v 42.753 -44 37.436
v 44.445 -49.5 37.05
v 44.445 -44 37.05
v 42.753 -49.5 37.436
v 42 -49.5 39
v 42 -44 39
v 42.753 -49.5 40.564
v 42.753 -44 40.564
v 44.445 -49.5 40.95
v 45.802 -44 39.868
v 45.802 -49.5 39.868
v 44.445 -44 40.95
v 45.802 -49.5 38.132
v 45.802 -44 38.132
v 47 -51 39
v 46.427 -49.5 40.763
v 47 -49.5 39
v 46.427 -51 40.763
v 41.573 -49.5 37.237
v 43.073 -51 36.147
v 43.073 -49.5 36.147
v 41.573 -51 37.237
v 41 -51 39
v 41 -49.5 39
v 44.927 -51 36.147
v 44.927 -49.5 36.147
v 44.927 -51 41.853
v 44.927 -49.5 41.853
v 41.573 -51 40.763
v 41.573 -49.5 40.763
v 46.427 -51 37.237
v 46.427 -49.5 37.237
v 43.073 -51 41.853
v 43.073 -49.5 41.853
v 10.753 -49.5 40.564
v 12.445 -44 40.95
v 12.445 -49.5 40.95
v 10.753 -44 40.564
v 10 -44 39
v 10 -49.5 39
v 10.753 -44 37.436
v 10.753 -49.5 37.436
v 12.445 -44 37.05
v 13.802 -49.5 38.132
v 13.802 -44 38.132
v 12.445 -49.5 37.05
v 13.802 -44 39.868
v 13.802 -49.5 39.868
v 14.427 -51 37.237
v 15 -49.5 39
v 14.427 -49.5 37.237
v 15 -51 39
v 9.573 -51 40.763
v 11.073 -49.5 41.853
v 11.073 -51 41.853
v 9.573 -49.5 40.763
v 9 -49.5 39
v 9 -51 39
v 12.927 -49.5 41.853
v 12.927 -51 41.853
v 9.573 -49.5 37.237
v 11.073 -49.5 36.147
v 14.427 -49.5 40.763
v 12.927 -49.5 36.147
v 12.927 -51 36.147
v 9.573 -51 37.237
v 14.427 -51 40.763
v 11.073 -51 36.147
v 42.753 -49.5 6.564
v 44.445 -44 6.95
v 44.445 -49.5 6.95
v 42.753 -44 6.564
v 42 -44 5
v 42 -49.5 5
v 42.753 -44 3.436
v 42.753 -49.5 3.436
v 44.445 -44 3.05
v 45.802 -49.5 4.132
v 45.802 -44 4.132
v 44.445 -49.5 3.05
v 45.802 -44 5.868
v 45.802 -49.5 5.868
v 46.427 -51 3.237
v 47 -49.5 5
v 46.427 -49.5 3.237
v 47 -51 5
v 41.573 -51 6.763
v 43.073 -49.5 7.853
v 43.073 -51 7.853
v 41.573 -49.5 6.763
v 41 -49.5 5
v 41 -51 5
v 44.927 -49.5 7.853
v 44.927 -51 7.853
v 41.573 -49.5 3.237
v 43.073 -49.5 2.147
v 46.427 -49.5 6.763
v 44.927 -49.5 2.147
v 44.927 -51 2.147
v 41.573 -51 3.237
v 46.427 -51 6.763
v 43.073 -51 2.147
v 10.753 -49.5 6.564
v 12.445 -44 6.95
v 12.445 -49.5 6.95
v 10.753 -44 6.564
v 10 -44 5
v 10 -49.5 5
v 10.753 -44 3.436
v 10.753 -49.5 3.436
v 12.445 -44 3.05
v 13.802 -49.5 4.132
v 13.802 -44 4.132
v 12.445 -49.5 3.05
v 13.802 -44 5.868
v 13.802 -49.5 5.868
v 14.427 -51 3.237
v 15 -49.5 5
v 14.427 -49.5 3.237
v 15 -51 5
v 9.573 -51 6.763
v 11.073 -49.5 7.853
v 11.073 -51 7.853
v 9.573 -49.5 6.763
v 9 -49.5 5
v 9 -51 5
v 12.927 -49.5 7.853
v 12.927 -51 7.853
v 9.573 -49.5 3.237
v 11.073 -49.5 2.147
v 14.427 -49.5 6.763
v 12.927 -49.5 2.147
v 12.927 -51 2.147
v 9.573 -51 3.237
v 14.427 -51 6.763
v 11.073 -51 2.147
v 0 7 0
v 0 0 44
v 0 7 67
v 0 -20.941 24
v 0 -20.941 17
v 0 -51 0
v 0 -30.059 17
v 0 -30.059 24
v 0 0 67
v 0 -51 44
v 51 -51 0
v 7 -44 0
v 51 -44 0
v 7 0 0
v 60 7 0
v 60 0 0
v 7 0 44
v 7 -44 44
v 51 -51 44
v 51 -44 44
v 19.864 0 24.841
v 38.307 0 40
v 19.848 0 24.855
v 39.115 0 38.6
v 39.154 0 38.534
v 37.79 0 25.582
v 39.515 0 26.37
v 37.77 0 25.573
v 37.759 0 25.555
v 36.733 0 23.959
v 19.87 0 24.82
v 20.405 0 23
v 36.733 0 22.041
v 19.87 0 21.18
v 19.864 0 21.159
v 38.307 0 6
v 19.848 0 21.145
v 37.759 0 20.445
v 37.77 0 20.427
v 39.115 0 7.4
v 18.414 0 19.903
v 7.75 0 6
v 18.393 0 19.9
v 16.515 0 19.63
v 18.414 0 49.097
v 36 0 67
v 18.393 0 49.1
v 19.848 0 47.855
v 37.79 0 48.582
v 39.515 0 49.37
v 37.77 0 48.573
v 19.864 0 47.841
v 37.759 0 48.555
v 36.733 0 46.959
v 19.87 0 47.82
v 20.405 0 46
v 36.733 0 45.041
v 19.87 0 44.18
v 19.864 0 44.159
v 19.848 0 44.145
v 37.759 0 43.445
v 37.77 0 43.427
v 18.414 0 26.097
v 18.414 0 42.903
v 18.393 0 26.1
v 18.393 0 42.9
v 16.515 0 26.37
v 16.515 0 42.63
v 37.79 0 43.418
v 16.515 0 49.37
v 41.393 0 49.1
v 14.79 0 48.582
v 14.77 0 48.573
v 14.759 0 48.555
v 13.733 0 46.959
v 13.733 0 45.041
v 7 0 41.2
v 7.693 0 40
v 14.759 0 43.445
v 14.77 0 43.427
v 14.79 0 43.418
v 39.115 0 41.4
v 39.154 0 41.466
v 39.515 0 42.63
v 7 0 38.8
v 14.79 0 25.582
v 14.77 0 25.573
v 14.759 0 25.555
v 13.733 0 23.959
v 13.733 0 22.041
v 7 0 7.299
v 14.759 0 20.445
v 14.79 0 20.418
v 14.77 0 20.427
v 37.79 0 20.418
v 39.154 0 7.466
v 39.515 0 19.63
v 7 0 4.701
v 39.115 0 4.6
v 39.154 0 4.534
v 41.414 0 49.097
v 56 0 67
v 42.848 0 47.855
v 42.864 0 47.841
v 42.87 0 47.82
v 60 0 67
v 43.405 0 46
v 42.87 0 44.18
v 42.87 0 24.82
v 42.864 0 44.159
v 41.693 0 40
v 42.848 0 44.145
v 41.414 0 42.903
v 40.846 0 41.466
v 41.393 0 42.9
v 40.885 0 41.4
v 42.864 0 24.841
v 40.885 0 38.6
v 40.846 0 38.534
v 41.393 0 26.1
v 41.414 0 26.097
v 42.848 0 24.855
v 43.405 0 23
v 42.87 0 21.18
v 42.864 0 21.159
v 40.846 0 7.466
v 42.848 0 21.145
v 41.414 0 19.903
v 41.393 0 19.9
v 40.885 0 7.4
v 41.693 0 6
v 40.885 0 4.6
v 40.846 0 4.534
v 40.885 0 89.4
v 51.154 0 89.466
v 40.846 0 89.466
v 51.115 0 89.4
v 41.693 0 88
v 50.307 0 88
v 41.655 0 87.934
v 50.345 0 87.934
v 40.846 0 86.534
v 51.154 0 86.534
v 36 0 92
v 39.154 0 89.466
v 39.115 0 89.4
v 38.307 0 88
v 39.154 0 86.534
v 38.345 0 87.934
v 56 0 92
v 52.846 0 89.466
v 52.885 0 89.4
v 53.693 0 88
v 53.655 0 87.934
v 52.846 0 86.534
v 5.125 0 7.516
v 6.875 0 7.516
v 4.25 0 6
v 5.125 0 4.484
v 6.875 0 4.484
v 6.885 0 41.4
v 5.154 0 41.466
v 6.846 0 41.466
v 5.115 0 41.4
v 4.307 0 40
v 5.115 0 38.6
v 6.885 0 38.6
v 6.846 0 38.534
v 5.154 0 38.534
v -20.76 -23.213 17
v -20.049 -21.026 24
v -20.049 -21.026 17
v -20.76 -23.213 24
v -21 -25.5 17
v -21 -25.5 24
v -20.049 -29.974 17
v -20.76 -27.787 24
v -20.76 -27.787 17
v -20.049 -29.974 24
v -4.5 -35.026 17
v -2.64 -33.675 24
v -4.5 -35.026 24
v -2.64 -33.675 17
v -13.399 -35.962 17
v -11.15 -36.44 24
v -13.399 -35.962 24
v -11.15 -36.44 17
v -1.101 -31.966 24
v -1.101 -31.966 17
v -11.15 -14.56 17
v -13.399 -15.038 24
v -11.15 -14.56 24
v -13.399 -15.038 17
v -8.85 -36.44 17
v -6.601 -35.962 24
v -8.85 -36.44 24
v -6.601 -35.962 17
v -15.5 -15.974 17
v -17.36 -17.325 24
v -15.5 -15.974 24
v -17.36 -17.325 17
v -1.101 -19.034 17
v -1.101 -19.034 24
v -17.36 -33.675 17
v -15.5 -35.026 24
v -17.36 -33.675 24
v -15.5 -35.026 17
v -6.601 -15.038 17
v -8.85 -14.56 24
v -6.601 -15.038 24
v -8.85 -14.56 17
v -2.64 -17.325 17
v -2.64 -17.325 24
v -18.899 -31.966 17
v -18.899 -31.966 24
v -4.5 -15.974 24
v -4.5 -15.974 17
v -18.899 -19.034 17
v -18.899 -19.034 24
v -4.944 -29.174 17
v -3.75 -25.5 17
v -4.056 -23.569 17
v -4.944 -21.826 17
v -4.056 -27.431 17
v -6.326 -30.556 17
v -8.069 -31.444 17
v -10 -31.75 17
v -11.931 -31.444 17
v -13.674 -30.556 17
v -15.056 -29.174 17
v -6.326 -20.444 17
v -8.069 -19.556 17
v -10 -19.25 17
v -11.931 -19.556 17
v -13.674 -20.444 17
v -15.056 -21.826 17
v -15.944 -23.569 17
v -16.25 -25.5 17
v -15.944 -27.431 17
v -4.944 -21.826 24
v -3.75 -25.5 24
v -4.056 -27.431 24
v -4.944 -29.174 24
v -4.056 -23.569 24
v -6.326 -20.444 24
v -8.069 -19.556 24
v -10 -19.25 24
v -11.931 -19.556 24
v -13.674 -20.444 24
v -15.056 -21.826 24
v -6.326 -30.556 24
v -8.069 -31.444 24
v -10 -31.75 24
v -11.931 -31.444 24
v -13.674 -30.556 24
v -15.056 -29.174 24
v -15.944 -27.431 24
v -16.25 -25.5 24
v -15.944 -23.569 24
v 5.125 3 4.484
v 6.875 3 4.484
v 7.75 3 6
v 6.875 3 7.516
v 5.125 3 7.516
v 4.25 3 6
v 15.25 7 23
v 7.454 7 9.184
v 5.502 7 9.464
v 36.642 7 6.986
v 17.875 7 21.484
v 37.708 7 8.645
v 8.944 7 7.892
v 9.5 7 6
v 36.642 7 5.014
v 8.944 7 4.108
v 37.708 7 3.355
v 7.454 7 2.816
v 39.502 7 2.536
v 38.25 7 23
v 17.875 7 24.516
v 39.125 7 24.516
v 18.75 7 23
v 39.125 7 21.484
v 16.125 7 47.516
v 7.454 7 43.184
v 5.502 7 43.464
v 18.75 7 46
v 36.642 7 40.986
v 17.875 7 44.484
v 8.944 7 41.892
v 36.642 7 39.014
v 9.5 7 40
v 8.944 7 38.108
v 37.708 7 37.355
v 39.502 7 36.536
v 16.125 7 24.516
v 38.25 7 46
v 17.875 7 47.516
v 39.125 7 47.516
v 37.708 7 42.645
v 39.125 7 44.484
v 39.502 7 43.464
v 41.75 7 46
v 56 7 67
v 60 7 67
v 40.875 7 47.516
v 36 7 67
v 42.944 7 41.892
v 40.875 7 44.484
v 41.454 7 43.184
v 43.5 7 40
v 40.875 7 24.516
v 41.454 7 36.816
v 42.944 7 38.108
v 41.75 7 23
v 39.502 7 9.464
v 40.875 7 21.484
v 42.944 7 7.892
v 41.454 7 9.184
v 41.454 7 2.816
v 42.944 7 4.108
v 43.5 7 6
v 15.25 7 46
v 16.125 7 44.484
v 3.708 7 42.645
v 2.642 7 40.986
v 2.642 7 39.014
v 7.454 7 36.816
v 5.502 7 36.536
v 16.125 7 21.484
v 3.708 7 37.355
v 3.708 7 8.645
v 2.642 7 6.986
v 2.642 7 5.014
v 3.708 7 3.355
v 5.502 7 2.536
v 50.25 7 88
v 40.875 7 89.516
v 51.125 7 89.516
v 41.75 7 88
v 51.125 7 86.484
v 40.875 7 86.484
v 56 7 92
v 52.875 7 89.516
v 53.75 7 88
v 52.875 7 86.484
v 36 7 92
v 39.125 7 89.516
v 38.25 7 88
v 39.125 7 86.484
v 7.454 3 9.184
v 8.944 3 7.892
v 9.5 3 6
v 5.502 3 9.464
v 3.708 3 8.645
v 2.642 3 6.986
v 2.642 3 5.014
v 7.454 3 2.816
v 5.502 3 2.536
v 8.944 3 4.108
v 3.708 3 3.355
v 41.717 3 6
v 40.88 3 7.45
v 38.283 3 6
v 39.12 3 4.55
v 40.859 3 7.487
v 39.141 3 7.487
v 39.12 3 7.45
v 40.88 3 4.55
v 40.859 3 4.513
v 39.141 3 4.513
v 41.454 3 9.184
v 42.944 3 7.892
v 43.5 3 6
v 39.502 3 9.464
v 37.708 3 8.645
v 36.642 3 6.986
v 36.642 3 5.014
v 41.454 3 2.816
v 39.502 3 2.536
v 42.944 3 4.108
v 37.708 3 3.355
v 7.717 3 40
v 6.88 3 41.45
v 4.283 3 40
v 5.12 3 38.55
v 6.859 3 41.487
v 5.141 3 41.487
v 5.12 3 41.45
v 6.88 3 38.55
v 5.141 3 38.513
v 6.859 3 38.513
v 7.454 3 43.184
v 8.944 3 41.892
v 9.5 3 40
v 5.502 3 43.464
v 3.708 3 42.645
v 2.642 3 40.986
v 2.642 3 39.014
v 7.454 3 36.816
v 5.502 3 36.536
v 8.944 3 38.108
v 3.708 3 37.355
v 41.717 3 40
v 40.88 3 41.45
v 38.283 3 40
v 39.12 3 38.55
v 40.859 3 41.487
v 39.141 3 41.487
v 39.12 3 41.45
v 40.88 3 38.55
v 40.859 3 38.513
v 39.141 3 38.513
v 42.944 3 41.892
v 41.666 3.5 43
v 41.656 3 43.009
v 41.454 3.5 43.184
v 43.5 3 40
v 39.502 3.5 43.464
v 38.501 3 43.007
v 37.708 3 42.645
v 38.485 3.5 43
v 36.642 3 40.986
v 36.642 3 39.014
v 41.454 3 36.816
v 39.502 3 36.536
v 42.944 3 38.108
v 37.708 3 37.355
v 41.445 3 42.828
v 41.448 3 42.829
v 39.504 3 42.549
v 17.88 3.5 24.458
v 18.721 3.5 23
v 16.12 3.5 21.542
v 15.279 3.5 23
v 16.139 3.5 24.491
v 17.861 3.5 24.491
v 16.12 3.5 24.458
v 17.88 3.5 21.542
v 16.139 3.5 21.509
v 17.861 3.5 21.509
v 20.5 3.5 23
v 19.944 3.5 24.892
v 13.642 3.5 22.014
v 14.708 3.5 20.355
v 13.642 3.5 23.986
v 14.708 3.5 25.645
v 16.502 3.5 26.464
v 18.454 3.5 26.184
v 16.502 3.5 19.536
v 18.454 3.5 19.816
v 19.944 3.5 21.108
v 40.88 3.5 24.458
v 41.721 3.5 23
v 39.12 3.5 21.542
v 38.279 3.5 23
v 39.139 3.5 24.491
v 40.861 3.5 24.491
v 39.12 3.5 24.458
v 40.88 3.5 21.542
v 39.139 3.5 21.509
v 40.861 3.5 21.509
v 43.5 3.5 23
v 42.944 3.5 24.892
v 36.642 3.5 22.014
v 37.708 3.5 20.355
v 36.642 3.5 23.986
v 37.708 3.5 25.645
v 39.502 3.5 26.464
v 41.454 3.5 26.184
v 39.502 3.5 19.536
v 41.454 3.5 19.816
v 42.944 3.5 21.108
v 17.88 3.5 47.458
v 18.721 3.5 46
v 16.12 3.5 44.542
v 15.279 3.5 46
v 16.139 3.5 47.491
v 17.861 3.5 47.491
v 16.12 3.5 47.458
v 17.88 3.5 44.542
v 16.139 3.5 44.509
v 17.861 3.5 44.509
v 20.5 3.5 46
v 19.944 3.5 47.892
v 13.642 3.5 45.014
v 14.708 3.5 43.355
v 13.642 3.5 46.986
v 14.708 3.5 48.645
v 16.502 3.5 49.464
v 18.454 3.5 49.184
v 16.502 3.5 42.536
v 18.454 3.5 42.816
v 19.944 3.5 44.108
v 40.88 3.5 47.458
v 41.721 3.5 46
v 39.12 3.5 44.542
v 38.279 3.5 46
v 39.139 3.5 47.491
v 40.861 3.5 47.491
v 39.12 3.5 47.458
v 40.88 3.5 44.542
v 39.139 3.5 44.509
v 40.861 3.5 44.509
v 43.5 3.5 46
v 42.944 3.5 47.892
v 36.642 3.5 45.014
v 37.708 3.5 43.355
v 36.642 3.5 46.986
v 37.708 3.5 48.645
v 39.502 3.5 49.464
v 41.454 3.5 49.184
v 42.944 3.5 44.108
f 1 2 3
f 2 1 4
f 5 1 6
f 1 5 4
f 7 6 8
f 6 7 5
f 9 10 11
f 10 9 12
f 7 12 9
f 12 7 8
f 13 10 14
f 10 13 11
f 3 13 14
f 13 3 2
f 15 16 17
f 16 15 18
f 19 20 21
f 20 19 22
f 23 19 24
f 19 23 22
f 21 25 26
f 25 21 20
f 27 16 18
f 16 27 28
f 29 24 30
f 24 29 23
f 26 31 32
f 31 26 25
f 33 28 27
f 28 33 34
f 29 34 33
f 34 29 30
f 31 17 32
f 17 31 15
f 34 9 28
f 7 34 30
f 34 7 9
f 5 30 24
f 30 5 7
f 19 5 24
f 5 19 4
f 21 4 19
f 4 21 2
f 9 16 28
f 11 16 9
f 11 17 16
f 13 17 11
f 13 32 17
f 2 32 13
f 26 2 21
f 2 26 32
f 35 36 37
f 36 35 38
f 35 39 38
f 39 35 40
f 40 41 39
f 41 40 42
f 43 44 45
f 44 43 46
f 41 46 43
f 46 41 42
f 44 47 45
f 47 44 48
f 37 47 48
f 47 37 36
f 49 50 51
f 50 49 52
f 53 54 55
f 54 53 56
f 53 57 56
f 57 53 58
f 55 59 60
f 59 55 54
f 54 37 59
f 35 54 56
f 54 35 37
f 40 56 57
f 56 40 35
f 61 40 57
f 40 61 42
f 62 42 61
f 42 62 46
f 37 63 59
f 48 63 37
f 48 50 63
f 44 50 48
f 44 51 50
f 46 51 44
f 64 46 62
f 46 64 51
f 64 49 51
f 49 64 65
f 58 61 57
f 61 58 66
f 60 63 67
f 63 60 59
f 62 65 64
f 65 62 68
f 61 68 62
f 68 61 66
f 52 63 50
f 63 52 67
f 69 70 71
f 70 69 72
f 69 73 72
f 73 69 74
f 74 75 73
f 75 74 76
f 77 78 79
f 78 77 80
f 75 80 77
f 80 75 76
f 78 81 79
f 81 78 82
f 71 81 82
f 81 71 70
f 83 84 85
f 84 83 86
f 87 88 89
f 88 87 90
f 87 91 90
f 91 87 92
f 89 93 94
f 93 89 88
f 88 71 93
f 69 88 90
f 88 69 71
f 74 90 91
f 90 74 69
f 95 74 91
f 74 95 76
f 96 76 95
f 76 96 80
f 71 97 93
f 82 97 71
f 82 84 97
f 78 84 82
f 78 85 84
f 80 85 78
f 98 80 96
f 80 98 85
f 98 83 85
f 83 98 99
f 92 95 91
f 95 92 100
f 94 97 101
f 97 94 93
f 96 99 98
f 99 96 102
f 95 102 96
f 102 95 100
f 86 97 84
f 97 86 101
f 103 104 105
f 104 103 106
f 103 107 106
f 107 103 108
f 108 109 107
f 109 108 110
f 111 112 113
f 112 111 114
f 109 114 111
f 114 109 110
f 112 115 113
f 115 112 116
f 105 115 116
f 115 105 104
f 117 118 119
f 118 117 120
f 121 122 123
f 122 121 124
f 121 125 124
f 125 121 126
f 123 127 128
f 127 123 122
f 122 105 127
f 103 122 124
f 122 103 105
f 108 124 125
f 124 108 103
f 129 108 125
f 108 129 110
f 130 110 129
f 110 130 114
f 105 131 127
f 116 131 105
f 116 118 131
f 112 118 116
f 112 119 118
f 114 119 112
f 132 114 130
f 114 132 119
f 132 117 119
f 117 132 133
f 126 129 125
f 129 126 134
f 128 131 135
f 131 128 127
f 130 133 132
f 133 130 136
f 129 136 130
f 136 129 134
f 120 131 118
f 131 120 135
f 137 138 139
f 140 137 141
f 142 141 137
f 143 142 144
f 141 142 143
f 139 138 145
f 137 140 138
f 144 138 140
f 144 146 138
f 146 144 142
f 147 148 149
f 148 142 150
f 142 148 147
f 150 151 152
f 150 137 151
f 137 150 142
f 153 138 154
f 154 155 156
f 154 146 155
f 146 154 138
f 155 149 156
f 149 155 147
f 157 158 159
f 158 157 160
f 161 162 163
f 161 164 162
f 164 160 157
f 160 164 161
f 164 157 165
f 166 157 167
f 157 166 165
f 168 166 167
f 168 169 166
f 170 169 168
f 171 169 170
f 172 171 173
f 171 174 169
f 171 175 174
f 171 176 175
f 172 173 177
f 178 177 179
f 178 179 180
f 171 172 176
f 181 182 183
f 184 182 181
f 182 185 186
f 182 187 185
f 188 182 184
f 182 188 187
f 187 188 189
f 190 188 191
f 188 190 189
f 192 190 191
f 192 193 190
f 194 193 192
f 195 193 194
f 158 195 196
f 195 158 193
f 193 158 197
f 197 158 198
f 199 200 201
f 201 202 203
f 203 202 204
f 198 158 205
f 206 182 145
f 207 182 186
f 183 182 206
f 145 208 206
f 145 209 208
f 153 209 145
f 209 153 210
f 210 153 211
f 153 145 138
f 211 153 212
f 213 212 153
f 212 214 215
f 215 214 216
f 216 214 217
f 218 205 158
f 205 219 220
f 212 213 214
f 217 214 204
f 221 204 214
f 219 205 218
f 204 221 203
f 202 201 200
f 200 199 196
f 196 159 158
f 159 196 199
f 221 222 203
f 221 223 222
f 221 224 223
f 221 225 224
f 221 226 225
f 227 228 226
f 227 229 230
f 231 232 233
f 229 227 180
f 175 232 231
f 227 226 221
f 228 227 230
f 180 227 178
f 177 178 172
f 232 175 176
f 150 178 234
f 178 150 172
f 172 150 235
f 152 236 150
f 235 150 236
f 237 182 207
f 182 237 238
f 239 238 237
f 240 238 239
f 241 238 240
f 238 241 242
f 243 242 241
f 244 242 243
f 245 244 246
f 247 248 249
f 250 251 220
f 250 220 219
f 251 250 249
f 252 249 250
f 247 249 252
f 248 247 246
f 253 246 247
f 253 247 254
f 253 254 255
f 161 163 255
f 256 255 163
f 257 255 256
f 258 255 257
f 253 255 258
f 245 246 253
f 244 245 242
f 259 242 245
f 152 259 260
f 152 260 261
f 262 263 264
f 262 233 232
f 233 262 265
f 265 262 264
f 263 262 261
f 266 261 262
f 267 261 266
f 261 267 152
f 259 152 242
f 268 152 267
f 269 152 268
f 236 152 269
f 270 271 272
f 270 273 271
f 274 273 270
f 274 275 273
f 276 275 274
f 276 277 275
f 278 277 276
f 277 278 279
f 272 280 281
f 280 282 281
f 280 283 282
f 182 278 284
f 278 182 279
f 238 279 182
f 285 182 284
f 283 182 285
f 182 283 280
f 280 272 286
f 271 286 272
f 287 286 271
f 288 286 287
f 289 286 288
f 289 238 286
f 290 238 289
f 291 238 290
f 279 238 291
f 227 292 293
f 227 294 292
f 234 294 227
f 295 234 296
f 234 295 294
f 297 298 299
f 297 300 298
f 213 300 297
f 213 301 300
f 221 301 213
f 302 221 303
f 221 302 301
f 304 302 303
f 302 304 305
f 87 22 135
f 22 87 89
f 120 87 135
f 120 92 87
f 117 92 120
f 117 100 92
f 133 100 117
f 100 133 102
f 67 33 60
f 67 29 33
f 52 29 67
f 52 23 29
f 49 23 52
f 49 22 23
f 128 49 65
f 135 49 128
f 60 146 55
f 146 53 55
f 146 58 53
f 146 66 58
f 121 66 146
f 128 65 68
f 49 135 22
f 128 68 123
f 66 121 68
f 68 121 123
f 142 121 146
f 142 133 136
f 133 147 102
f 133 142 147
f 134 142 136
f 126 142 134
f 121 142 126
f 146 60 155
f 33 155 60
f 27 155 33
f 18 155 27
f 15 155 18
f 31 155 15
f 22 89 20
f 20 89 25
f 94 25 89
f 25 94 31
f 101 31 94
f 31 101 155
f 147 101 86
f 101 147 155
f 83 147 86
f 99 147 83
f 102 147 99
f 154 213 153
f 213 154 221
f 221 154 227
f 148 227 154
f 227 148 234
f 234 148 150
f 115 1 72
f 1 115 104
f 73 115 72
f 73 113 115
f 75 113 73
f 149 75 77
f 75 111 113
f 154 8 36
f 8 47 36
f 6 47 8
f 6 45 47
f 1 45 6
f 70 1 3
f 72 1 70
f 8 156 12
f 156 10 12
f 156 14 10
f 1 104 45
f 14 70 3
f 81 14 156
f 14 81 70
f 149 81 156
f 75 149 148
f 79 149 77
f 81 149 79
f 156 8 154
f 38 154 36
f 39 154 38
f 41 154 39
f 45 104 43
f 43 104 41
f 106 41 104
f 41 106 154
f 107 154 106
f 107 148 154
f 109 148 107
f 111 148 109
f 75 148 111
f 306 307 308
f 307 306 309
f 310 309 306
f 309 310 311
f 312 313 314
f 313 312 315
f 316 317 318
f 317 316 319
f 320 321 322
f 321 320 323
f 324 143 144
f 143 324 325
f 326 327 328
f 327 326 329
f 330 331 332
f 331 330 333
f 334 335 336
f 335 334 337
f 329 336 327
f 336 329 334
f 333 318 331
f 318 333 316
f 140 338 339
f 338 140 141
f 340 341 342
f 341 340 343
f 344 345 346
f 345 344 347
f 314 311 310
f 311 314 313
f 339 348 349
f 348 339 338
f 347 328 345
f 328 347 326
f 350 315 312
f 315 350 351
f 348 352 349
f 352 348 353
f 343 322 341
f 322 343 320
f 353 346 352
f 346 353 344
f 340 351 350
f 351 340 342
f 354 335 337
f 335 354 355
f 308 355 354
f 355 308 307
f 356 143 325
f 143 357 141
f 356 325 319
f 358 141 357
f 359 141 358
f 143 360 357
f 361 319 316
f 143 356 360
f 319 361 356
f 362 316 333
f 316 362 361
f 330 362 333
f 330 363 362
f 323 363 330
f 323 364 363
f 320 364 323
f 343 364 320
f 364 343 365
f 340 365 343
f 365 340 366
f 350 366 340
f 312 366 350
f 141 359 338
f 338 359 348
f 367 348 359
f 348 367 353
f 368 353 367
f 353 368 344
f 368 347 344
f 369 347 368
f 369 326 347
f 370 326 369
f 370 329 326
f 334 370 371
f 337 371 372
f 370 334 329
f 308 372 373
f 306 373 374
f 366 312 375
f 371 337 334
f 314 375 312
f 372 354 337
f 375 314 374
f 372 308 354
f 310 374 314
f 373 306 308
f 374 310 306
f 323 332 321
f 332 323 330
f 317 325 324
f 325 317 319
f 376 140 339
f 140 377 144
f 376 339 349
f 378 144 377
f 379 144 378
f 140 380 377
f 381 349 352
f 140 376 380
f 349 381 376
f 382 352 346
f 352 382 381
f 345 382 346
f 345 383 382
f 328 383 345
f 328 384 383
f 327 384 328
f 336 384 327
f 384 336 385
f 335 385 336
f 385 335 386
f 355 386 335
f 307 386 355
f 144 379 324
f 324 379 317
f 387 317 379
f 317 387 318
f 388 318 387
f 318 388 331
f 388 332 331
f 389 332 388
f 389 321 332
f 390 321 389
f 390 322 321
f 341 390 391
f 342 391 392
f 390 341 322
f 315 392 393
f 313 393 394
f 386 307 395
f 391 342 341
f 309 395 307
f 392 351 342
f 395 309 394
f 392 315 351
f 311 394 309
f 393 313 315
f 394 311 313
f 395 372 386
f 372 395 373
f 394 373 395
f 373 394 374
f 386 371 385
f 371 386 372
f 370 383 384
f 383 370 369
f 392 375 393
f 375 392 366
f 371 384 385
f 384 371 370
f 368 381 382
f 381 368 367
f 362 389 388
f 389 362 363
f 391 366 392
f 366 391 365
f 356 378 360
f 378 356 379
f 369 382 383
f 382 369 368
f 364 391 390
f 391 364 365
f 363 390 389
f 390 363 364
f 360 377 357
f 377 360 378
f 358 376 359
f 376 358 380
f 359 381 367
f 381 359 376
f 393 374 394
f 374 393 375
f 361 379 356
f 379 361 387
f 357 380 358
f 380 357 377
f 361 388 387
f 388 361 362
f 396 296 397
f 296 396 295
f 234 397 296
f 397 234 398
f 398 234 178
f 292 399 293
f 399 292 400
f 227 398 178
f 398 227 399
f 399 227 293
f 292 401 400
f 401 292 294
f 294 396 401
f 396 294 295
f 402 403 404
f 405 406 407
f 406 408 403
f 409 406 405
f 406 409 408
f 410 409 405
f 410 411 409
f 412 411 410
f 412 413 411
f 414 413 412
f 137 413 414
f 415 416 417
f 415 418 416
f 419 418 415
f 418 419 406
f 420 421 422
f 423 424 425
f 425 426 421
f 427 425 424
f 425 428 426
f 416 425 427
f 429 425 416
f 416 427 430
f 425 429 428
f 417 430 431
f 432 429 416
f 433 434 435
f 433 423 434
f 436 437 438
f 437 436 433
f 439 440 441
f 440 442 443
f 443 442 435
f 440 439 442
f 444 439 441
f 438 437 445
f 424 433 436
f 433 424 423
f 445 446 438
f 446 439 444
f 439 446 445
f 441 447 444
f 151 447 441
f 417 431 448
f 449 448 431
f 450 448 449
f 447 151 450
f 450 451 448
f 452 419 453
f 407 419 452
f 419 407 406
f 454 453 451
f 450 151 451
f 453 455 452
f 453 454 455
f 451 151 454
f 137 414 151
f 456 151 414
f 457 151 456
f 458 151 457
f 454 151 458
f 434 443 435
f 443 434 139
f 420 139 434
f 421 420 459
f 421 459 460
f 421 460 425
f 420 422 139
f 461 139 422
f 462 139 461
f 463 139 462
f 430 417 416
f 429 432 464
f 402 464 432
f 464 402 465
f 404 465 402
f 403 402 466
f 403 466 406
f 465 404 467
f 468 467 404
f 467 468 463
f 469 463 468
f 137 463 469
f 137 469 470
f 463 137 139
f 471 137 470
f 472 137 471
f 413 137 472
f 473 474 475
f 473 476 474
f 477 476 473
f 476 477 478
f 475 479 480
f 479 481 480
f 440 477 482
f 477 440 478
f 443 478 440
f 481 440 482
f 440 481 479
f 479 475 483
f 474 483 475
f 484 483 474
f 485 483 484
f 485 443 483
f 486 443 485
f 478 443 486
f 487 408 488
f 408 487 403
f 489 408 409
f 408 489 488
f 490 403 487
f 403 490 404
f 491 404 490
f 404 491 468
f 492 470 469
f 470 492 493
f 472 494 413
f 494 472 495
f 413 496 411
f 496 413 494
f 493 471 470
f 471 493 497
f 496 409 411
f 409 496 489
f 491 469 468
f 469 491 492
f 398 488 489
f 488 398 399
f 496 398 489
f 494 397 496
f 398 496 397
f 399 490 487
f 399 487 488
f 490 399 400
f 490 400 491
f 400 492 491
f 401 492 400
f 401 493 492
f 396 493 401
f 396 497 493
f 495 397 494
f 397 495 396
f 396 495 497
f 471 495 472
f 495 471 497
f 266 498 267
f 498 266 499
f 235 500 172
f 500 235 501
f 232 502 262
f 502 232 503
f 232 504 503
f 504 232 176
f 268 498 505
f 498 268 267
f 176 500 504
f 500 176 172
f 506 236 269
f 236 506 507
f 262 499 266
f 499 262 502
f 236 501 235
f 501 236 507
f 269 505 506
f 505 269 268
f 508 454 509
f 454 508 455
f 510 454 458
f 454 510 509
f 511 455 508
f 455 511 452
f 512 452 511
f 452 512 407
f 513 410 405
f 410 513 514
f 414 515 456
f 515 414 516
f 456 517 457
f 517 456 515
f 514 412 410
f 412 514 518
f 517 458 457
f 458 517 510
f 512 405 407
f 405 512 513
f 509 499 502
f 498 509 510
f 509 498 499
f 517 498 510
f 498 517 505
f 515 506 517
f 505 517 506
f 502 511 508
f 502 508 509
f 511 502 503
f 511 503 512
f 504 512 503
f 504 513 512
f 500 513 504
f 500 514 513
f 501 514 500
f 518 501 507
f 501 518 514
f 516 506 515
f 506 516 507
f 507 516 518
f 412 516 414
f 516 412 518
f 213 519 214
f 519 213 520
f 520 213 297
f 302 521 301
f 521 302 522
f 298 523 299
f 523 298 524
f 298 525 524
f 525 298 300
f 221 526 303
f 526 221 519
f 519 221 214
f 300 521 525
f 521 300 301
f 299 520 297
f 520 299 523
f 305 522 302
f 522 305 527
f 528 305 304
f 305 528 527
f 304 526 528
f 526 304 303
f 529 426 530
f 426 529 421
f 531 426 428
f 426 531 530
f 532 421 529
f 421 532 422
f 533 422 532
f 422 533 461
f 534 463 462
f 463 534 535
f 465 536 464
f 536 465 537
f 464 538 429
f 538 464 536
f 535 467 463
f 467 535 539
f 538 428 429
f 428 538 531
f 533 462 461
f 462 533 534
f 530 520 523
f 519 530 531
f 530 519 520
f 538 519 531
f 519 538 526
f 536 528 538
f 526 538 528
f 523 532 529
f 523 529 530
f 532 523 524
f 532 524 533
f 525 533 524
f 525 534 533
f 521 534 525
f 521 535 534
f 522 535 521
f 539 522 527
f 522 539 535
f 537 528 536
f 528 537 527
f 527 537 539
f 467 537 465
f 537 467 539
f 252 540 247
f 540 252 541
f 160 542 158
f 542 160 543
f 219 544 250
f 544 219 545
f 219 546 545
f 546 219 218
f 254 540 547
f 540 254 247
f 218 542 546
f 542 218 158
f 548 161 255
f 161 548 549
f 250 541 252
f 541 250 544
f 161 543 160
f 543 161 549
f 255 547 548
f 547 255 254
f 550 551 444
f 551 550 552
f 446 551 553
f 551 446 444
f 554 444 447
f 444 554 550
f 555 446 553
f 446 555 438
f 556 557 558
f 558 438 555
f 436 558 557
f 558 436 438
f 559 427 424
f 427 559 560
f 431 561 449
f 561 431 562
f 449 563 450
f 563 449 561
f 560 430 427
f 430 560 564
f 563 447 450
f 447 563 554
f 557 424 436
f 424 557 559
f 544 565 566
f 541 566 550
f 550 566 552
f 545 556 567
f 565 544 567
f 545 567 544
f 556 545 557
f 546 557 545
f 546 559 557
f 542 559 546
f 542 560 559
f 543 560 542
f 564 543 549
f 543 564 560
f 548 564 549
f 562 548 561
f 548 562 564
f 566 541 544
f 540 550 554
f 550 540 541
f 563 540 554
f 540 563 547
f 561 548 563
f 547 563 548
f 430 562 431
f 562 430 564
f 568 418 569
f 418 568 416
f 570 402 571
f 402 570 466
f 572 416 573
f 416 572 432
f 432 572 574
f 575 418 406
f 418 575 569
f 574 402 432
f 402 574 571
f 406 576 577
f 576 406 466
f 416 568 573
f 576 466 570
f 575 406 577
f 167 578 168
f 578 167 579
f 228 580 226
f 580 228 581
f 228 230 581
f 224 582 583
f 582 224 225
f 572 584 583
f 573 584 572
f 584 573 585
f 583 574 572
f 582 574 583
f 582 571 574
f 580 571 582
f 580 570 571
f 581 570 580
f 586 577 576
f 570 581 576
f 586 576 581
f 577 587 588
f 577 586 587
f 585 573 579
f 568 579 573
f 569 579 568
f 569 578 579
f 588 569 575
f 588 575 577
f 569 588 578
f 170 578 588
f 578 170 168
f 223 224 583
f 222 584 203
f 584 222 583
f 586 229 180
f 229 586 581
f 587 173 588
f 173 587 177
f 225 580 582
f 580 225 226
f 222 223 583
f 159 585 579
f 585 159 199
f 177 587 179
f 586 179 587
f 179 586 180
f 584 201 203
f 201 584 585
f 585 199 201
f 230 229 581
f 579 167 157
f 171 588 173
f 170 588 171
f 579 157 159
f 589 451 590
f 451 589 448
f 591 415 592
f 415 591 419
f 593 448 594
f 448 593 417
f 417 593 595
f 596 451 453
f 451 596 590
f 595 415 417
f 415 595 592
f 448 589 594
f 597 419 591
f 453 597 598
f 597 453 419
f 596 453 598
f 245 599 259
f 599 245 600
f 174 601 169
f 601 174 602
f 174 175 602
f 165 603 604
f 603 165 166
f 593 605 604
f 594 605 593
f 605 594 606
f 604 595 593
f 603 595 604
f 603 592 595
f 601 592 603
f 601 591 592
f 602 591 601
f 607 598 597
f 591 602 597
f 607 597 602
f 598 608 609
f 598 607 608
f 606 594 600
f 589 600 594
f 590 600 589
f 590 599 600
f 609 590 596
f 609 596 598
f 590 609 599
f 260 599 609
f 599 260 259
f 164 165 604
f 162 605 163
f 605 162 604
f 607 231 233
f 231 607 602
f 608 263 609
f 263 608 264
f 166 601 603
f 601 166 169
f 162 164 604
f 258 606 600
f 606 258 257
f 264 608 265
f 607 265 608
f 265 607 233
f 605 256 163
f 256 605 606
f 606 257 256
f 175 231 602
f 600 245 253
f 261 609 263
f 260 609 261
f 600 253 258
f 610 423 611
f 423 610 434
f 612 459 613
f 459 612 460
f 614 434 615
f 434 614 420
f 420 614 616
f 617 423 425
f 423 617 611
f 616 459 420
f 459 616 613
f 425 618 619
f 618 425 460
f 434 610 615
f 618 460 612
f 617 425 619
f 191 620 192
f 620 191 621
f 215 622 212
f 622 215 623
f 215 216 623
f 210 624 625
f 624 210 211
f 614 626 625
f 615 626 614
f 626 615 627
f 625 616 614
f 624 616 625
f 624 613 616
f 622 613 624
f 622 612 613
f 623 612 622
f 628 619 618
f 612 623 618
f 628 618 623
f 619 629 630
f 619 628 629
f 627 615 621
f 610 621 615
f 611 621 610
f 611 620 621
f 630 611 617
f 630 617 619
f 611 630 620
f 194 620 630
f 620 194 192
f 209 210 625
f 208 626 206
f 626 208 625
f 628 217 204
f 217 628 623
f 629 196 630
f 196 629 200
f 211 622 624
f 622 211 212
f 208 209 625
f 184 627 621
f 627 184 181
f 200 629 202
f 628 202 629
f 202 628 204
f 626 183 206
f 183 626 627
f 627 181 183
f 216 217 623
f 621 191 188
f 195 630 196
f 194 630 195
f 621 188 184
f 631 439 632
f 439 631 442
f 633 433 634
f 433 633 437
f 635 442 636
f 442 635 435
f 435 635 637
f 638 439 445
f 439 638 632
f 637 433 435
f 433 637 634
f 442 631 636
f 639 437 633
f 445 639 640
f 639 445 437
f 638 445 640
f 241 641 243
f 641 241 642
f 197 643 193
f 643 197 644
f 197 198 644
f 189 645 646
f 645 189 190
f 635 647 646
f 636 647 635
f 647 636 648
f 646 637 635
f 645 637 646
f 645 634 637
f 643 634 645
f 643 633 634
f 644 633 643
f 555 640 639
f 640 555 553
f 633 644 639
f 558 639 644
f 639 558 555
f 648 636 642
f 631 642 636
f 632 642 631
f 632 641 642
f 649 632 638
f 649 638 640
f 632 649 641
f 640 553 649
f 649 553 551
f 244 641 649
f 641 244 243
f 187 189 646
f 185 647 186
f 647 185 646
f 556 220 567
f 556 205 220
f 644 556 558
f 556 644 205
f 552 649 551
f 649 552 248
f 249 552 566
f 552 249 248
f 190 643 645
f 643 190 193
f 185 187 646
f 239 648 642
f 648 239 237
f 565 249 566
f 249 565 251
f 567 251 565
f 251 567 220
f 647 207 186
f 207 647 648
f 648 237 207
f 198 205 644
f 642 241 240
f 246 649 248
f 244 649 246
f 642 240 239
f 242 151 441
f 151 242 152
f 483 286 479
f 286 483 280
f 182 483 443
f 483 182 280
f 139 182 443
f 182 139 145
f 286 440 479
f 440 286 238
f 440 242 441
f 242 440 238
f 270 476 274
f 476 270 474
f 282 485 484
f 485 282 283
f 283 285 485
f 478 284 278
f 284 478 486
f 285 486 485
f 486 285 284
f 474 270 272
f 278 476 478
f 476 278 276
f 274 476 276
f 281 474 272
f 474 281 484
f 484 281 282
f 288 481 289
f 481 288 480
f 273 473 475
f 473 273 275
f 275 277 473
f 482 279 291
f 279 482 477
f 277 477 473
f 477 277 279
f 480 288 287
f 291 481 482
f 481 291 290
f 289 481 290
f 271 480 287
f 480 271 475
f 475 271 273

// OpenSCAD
// Outer dimensions.
hermes_hole_distance = 34;
m3_hole_diam = 2;
m3_rim_diam = 3;
m3_hole_rim = 3;
hermes_spacing = 5;
block_size = hermes_hole_distance + hermes_spacing + hermes_spacing;
thickness = 6;

// Taken from https://gist.github.com/Stemer114/7e420ea8ad9733c4e0ba
module ring(
        h = 1,
        od = 10,
        id = 5,
        de = 0.1
        ) 
{
    difference() {
        cylinder(h=h, r=od/2);
        translate([0, 0, -de])
            cylinder(h=h+2*de, r=id/2);
    }
}

// Front-clamp with Z-probe ring.
translate([block_size + thickness, -block_size - thickness, block_size])
{
    rotate(a = [180, 0 , 180])
    {
        difference()
        {
            cube([block_size + thickness, block_size + thickness, block_size]);
            translate([0, thickness, 0])
            {
                cube([block_size, block_size, block_size]);
            }
            
            // Mounting hole, Hermes, left-lower.
            translate([hermes_spacing + 2, 0, hermes_spacing])
            {
                rotate(a = [90, 0, 0])
                {
                     cylinder(h = block_size, r = m3_hole_diam, center = true);
                     cylinder(h = m3_hole_rim, r = m3_rim_diam, center = true);
                }
            }
            
            // Mounting hole, Hermes, right-lower.
            translate([hermes_spacing + hermes_hole_distance, 0, hermes_spacing])
            {
                rotate(a = [-90, 0 , 0])
                {
                     cylinder(h = block_size, r = m3_hole_diam, center = true);
                     cylinder(h = m3_hole_rim, r = m3_rim_diam, center = true);
                }
            }
           
            // Mounting hole, Hermes, left-top.
            translate([hermes_spacing + 2, 0, hermes_spacing + hermes_hole_distance])
            {
                rotate(a = [-90, 0 , 0])
                {
                     cylinder(h = block_size, r = m3_hole_diam, center = true);
                     cylinder(h = m3_hole_rim, r = m3_rim_diam, center = true);
                }
            } 

           
            // Mounting hole, Hermes, right-top.
            translate([hermes_spacing + hermes_hole_distance, 0, hermes_spacing + hermes_hole_distance])
            {
                rotate(a = [-90, 0 , 0])
                {
                     cylinder(h = block_size, r = m3_hole_diam, center = true);
                     cylinder(h = m3_hole_rim, r = m3_rim_diam, center = true);
                }
            } 
            
        }

        translate([block_size + thickness + 10, (block_size + thickness) / 2, 20])
        {
            ring(h = thickness, od = 22, id = 12.5, de = 0.1);
        }
    }
}

m3 = 1.75;
m3_sinkhole = 3.5;
sinkhole_height = 4;
border = 6;
thickness = 7;
width = 60; //92;
height = 92;
hermes_hole_distance = 34;
prusa_hole_distance = 23;
prusa_border_x = 17;
prusa_border_y = 23;
cable_lip_width = 20;
cable_lip_height = 25;
cable_lip_gap_right = 4;
cable_lip_distance = 4;
cable_lip_gap_left = width - cable_lip_width - cable_lip_gap_right;

translate([0, thickness, 0])
{
    rotate(a = [90, 0 , 0])
    {
        difference()
        {
            cube([width, height, thickness]);
            
            // Hermes lower left hole.
            translate([border, border, 0])
            {
                cylinder(h = height, r1 = m3, r2 = m3);
                cylinder(h = sinkhole_height, r1 = m3_sinkhole, r2 = m3_sinkhole);   
            }
            
            // Hermes lower right hole.
            translate([border + hermes_hole_distance, border, 0])
            {
                cylinder(h = height, r1 = m3);
                cylinder(h = sinkhole_height, r1 = m3_sinkhole, r2 = m3_sinkhole);
            }
            
            // Hermes higher left hole.
            translate([border, border + hermes_hole_distance, 0])
            {
                cylinder(h = height, r1 = m3);
                cylinder(h = sinkhole_height, r1 = m3_sinkhole, r2 = m3_sinkhole);
            }
            
            // Hermes higher right hole.
            translate([border + hermes_hole_distance, border + hermes_hole_distance, 0])
            {
                cylinder(h = height, r1 = m3);
                cylinder(h = sinkhole_height, r1 = m3_sinkhole, r2 = m3_sinkhole);
            }
            
            // Prusa lower left hole.
            translate([prusa_border_x, prusa_border_y, 0])
            {
                cylinder(h = height, r1 = m3);
                translate([0, 0, thickness / 2])
                {
                    cylinder(h = height, r1 = m3_sinkhole);
                }      
            }
            
            // Prusa lower right hole.
            translate([prusa_border_x + prusa_hole_distance, prusa_border_y, 0])
            {
                cylinder(h = height, r1 = m3);
                translate([0, 0, thickness / 2])
                {
                    cylinder(h = height, r1 = m3_sinkhole);
                }
            }
            
            // Prusa higher left hole.
            translate([prusa_border_x, prusa_border_y + prusa_hole_distance, 0])
            {
                cylinder(h = height, r1 = m3);
                translate([0, 0, thickness / 2])
                {
                    cylinder(h = height, r1 = m3_sinkhole);
                } 
            }
            
            // Prusa higher right hole.
            translate([prusa_border_x + prusa_hole_distance, prusa_border_y + prusa_hole_distance, 0])
            {
                cylinder(h = height, r1 = m3);
                translate([0, 0, thickness / 2])
                {
                    cylinder(h = height, r1 = m3_sinkhole);
                } 
            }   
            
            // Cut-out of top-left corner.
            translate([0, height - cable_lip_height, 0])
            {
                cube([cable_lip_gap_left, cable_lip_height, thickness]);
            }
            
            // Cut-out of right-top corner.
            translate([width - cable_lip_gap_right, height - cable_lip_height, 0])
            {
                cube([cable_lip_gap_right, cable_lip_height, thickness]);
            }
            
            // Hole for tie-wrap, left.
            translate([cable_lip_gap_left + cable_lip_distance, height - cable_lip_distance, 0])
            {
                cylinder(h = height, r1 = m3);
            }
            
            // Hole for tie-wrap, right.
            translate([cable_lip_gap_left + cable_lip_width - cable_lip_distance, height - cable_lip_distance, 0])
            {
                cylinder(h = height, r1 = m3);
            }
            
        }
    }
}
